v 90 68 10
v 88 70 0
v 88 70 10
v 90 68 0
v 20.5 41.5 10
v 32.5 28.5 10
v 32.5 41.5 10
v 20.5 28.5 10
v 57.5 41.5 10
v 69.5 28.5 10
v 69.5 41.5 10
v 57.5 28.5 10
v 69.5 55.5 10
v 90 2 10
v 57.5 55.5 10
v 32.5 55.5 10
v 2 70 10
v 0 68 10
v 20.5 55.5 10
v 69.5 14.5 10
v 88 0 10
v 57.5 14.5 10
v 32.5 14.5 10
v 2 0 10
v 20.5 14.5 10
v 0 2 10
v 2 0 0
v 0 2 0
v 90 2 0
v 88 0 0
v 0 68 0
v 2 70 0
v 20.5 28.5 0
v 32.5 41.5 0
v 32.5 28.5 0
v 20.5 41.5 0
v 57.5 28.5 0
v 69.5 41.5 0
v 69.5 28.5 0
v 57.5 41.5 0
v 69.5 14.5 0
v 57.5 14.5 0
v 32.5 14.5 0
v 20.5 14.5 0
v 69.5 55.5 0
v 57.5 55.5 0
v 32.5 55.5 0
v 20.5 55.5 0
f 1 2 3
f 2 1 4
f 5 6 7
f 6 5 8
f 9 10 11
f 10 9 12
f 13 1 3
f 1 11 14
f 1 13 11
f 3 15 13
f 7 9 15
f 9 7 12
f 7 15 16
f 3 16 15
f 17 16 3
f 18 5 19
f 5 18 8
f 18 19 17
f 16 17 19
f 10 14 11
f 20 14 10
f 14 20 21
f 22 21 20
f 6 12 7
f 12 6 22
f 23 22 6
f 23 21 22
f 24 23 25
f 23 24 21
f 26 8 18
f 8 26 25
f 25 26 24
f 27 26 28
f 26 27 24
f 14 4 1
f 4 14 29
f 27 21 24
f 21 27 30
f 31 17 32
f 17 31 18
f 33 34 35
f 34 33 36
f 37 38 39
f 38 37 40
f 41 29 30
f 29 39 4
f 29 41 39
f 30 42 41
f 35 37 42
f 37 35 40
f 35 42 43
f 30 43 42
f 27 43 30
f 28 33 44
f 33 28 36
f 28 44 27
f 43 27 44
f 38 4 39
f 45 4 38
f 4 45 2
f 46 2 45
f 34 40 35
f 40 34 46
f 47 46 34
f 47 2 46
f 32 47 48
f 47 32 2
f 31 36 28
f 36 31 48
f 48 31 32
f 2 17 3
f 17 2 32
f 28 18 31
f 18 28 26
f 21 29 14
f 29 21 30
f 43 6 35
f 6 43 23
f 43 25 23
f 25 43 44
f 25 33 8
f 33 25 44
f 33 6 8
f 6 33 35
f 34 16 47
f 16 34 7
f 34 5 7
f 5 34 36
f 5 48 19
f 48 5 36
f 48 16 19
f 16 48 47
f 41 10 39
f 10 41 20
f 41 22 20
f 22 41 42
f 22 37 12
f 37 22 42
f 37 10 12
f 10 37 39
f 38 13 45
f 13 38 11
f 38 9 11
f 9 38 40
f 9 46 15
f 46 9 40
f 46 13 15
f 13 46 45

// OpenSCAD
$fn = 32;

// ----------------------------------------------------------------------
// Windowed plate: 4 voids, 90 x 70 x 10 mm
// ----------------------------------------------------------------------

// --- parameters (mm) ---
plate_l = 90;             // plate length, X
plate_w = 70;             // plate width, Y
plate_t = 10;             // plate thickness, Z
edge_margin = 8;          // wall from the plate edge to any window
win_l = 12;               // pocket length
win_w = 14;               // pocket width
pitch_x = 37;             // grid pitch along X
pitch_y = 27;             // grid pitch along Y
depth_1 = 10;             // depth of void 1 (full thickness = through)
depth_2 = 10;             // depth of void 2 (full thickness = through)
depth_3 = 10;             // depth of void 3 (full thickness = through)
depth_4 = 10;             // depth of void 4 (full thickness = through)
corner_c = 2;             // corner chamfer of the plate

profile = [[2, 0], [88, 0], [90, 2], [90, 68], [88, 70], [2, 70], [0, 68], [0, 2]];  // primary outline, 8 points, counter clockwise
void_1 = [[20.5, 14.5], [32.5, 14.5], [32.5, 28.5], [20.5, 28.5]];  // pocket at grid node 0,0, 4 points
void_2 = [[20.5, 41.5], [32.5, 41.5], [32.5, 55.5], [20.5, 55.5]];  // pocket at grid node 0,1, 4 points
void_3 = [[57.5, 14.5], [69.5, 14.5], [69.5, 28.5], [57.5, 28.5]];  // pocket at grid node 1,0, 4 points
void_4 = [[57.5, 41.5], [69.5, 41.5], [69.5, 55.5], [57.5, 55.5]];  // pocket at grid node 1,1, 4 points

// --- the one profile operation ---
difference() {
  linear_extrude(height = plate_t) polygon(points = profile);
  translate([0, 0, -1])
    linear_extrude(height = plate_t + 2) polygon(points = void_1);
  translate([0, 0, -1])
    linear_extrude(height = plate_t + 2) polygon(points = void_2);
  translate([0, 0, -1])
    linear_extrude(height = plate_t + 2) polygon(points = void_3);
  translate([0, 0, -1])
    linear_extrude(height = plate_t + 2) polygon(points = void_4);
}
